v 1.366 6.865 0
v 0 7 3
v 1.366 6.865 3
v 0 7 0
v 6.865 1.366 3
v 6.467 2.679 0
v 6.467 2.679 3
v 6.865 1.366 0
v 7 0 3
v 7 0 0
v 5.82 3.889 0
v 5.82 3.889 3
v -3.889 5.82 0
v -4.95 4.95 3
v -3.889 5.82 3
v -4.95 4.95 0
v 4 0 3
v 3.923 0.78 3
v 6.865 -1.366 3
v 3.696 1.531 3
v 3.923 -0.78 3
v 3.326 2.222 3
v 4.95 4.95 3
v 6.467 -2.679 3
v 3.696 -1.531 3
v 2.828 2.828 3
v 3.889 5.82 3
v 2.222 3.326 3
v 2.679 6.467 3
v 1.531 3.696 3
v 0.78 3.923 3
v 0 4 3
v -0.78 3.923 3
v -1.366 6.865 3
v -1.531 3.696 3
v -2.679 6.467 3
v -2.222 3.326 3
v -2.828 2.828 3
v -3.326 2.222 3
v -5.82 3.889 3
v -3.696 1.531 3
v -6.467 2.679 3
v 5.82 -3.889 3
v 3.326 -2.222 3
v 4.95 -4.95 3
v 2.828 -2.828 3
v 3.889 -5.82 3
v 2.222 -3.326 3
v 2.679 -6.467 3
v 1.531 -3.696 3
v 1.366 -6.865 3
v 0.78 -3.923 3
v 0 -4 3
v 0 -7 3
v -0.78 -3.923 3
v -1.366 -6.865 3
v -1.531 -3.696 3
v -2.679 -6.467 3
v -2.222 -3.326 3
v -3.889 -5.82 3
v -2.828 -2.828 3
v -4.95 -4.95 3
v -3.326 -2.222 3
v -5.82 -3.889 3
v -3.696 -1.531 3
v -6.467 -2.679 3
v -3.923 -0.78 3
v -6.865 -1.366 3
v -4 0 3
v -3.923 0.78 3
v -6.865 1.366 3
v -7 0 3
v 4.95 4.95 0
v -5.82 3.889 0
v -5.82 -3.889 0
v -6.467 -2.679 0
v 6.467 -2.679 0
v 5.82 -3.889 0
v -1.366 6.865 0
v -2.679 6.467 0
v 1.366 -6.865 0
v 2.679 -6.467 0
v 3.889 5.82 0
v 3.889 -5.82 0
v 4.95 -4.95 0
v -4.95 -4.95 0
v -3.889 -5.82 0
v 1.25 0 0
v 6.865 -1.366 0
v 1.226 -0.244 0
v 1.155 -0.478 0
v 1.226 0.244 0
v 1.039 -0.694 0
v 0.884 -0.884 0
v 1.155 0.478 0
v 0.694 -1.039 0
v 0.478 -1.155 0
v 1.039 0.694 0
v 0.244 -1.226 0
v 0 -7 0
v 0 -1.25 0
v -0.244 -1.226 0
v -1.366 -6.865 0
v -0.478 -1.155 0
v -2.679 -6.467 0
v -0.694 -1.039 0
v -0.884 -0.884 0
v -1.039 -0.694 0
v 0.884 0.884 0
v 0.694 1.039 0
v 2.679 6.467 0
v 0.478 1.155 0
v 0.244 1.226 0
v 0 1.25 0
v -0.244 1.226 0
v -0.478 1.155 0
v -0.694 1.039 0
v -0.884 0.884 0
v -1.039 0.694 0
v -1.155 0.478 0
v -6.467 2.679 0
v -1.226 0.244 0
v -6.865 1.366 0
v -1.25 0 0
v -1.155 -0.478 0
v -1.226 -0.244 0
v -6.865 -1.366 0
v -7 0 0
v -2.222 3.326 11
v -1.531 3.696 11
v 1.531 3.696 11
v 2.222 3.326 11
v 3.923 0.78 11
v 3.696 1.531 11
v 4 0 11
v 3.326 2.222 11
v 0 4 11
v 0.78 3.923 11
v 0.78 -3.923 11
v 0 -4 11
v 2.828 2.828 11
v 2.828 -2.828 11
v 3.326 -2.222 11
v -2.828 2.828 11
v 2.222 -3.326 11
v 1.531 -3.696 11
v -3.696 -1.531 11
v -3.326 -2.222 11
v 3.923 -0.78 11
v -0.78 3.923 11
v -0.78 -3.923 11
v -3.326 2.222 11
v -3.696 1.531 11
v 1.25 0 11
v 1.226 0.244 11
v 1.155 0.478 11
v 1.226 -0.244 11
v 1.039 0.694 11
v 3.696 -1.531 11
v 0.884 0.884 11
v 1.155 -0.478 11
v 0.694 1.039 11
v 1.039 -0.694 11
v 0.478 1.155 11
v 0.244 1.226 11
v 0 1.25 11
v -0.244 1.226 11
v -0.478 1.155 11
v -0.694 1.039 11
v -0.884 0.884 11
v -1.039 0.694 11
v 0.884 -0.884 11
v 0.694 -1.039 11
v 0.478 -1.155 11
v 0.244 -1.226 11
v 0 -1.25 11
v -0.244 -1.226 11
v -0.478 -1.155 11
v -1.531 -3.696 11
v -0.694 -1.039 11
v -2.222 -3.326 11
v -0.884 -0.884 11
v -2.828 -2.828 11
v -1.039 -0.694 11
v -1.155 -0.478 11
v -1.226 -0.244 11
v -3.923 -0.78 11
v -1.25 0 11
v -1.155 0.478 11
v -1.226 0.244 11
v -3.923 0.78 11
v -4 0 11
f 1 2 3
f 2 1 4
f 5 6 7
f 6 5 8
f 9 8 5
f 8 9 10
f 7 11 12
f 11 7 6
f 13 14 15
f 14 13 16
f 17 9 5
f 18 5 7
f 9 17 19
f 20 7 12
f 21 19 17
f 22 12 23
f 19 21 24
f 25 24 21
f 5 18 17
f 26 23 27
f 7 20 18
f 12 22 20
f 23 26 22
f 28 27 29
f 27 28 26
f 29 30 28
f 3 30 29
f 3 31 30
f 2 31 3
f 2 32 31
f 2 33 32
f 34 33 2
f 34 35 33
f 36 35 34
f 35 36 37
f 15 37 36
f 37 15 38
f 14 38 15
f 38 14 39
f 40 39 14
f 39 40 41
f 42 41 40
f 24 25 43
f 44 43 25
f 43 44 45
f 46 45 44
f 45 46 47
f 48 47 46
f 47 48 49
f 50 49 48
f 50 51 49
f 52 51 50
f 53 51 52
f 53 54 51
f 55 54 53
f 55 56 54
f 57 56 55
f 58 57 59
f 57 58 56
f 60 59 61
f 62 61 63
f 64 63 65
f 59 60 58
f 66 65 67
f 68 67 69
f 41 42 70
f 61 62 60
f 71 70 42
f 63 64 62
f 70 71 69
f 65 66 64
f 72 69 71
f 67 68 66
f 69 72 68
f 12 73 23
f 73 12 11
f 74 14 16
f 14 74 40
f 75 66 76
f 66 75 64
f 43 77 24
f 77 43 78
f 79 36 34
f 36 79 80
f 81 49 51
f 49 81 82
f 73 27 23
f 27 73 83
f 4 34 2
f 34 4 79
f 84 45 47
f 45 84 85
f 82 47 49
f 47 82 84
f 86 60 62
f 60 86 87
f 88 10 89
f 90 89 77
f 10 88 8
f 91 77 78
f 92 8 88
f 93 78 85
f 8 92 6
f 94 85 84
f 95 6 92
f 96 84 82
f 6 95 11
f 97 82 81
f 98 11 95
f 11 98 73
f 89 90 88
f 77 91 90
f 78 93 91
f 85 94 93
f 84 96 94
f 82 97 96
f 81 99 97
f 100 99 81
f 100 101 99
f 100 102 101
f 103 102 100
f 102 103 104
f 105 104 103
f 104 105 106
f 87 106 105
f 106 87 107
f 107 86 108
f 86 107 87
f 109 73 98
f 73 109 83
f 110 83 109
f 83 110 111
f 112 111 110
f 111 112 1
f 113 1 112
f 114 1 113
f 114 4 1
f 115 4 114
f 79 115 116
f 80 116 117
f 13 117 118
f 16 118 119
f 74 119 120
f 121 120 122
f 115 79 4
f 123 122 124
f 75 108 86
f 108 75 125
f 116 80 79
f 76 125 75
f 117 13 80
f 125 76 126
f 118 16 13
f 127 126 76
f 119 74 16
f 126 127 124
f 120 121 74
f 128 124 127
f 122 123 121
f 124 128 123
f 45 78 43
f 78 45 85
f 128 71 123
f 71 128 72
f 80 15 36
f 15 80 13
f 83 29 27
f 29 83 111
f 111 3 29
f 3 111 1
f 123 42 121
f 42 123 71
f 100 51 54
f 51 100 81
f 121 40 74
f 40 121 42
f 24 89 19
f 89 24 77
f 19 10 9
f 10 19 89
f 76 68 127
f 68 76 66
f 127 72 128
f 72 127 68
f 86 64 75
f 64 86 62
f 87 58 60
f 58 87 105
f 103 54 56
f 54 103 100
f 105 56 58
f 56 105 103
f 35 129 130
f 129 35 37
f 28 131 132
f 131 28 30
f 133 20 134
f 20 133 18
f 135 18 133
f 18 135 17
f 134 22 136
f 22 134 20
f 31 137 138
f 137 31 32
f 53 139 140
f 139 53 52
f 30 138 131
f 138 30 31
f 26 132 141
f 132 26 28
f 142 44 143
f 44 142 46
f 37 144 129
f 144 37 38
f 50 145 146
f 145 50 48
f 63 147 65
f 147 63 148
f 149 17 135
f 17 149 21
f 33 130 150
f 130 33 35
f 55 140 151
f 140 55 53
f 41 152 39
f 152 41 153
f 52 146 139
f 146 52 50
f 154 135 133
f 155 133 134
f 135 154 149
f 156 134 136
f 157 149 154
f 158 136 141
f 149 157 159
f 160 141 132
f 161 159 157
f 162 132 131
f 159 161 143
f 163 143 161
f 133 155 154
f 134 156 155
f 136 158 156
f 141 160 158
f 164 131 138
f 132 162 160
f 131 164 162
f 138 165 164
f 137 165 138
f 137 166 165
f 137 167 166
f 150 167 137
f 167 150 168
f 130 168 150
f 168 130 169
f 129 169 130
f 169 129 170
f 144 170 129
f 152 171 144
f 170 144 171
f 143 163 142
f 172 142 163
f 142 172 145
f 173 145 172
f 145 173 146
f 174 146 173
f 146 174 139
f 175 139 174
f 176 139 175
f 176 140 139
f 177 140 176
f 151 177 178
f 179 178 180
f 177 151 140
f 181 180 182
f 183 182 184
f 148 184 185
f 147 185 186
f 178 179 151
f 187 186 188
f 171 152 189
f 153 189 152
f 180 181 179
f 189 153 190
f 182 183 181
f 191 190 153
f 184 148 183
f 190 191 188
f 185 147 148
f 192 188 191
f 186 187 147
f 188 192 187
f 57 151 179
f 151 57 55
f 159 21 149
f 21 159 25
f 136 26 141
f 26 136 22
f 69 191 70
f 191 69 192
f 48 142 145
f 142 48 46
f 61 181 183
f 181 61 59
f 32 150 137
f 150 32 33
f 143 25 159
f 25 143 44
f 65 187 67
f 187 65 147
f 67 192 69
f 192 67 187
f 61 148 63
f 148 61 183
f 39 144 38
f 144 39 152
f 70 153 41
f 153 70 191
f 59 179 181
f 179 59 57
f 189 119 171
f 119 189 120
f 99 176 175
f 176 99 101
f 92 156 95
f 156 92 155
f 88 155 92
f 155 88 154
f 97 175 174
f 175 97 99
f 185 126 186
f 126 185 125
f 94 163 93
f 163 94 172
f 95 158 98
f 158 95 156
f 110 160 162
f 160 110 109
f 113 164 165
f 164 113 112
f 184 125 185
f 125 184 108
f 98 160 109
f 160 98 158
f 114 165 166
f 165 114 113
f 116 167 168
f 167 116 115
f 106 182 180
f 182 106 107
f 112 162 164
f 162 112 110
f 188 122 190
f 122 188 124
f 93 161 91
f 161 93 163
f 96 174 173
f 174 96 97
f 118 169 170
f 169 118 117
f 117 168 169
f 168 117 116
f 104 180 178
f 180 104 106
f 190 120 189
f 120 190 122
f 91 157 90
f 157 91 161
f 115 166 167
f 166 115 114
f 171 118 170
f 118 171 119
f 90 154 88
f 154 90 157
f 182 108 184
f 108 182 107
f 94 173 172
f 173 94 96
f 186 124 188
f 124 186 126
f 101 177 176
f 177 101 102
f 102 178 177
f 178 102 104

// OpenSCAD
$fn = 32;

// ----------------------------------------------------------------------
// Micro post: flanged post, 5-20 mm class
// ----------------------------------------------------------------------

// --- parameters (mm) ---
post_d = 8;               // post diameter
post_h = 8;               // post height above the flange
flange_d = 14;            // flange diameter
flange_t = 3;             // flange thickness
bore_d = 2.5;             // through bore
fit_tol = 0.1;            // tolerance for press fits, mm
free_tol = 0.5;           // tolerance for clearance fits, mm

total_h = post_h + flange_t;  // overall height

difference() {
  union() {
    cylinder(h = flange_t, d = flange_d);
    translate([0, 0, flange_t]) cylinder(h = post_h, d = post_d);
  }
  translate([0, 0, -1]) cylinder(h = total_h + 2, d = bore_d);
}
